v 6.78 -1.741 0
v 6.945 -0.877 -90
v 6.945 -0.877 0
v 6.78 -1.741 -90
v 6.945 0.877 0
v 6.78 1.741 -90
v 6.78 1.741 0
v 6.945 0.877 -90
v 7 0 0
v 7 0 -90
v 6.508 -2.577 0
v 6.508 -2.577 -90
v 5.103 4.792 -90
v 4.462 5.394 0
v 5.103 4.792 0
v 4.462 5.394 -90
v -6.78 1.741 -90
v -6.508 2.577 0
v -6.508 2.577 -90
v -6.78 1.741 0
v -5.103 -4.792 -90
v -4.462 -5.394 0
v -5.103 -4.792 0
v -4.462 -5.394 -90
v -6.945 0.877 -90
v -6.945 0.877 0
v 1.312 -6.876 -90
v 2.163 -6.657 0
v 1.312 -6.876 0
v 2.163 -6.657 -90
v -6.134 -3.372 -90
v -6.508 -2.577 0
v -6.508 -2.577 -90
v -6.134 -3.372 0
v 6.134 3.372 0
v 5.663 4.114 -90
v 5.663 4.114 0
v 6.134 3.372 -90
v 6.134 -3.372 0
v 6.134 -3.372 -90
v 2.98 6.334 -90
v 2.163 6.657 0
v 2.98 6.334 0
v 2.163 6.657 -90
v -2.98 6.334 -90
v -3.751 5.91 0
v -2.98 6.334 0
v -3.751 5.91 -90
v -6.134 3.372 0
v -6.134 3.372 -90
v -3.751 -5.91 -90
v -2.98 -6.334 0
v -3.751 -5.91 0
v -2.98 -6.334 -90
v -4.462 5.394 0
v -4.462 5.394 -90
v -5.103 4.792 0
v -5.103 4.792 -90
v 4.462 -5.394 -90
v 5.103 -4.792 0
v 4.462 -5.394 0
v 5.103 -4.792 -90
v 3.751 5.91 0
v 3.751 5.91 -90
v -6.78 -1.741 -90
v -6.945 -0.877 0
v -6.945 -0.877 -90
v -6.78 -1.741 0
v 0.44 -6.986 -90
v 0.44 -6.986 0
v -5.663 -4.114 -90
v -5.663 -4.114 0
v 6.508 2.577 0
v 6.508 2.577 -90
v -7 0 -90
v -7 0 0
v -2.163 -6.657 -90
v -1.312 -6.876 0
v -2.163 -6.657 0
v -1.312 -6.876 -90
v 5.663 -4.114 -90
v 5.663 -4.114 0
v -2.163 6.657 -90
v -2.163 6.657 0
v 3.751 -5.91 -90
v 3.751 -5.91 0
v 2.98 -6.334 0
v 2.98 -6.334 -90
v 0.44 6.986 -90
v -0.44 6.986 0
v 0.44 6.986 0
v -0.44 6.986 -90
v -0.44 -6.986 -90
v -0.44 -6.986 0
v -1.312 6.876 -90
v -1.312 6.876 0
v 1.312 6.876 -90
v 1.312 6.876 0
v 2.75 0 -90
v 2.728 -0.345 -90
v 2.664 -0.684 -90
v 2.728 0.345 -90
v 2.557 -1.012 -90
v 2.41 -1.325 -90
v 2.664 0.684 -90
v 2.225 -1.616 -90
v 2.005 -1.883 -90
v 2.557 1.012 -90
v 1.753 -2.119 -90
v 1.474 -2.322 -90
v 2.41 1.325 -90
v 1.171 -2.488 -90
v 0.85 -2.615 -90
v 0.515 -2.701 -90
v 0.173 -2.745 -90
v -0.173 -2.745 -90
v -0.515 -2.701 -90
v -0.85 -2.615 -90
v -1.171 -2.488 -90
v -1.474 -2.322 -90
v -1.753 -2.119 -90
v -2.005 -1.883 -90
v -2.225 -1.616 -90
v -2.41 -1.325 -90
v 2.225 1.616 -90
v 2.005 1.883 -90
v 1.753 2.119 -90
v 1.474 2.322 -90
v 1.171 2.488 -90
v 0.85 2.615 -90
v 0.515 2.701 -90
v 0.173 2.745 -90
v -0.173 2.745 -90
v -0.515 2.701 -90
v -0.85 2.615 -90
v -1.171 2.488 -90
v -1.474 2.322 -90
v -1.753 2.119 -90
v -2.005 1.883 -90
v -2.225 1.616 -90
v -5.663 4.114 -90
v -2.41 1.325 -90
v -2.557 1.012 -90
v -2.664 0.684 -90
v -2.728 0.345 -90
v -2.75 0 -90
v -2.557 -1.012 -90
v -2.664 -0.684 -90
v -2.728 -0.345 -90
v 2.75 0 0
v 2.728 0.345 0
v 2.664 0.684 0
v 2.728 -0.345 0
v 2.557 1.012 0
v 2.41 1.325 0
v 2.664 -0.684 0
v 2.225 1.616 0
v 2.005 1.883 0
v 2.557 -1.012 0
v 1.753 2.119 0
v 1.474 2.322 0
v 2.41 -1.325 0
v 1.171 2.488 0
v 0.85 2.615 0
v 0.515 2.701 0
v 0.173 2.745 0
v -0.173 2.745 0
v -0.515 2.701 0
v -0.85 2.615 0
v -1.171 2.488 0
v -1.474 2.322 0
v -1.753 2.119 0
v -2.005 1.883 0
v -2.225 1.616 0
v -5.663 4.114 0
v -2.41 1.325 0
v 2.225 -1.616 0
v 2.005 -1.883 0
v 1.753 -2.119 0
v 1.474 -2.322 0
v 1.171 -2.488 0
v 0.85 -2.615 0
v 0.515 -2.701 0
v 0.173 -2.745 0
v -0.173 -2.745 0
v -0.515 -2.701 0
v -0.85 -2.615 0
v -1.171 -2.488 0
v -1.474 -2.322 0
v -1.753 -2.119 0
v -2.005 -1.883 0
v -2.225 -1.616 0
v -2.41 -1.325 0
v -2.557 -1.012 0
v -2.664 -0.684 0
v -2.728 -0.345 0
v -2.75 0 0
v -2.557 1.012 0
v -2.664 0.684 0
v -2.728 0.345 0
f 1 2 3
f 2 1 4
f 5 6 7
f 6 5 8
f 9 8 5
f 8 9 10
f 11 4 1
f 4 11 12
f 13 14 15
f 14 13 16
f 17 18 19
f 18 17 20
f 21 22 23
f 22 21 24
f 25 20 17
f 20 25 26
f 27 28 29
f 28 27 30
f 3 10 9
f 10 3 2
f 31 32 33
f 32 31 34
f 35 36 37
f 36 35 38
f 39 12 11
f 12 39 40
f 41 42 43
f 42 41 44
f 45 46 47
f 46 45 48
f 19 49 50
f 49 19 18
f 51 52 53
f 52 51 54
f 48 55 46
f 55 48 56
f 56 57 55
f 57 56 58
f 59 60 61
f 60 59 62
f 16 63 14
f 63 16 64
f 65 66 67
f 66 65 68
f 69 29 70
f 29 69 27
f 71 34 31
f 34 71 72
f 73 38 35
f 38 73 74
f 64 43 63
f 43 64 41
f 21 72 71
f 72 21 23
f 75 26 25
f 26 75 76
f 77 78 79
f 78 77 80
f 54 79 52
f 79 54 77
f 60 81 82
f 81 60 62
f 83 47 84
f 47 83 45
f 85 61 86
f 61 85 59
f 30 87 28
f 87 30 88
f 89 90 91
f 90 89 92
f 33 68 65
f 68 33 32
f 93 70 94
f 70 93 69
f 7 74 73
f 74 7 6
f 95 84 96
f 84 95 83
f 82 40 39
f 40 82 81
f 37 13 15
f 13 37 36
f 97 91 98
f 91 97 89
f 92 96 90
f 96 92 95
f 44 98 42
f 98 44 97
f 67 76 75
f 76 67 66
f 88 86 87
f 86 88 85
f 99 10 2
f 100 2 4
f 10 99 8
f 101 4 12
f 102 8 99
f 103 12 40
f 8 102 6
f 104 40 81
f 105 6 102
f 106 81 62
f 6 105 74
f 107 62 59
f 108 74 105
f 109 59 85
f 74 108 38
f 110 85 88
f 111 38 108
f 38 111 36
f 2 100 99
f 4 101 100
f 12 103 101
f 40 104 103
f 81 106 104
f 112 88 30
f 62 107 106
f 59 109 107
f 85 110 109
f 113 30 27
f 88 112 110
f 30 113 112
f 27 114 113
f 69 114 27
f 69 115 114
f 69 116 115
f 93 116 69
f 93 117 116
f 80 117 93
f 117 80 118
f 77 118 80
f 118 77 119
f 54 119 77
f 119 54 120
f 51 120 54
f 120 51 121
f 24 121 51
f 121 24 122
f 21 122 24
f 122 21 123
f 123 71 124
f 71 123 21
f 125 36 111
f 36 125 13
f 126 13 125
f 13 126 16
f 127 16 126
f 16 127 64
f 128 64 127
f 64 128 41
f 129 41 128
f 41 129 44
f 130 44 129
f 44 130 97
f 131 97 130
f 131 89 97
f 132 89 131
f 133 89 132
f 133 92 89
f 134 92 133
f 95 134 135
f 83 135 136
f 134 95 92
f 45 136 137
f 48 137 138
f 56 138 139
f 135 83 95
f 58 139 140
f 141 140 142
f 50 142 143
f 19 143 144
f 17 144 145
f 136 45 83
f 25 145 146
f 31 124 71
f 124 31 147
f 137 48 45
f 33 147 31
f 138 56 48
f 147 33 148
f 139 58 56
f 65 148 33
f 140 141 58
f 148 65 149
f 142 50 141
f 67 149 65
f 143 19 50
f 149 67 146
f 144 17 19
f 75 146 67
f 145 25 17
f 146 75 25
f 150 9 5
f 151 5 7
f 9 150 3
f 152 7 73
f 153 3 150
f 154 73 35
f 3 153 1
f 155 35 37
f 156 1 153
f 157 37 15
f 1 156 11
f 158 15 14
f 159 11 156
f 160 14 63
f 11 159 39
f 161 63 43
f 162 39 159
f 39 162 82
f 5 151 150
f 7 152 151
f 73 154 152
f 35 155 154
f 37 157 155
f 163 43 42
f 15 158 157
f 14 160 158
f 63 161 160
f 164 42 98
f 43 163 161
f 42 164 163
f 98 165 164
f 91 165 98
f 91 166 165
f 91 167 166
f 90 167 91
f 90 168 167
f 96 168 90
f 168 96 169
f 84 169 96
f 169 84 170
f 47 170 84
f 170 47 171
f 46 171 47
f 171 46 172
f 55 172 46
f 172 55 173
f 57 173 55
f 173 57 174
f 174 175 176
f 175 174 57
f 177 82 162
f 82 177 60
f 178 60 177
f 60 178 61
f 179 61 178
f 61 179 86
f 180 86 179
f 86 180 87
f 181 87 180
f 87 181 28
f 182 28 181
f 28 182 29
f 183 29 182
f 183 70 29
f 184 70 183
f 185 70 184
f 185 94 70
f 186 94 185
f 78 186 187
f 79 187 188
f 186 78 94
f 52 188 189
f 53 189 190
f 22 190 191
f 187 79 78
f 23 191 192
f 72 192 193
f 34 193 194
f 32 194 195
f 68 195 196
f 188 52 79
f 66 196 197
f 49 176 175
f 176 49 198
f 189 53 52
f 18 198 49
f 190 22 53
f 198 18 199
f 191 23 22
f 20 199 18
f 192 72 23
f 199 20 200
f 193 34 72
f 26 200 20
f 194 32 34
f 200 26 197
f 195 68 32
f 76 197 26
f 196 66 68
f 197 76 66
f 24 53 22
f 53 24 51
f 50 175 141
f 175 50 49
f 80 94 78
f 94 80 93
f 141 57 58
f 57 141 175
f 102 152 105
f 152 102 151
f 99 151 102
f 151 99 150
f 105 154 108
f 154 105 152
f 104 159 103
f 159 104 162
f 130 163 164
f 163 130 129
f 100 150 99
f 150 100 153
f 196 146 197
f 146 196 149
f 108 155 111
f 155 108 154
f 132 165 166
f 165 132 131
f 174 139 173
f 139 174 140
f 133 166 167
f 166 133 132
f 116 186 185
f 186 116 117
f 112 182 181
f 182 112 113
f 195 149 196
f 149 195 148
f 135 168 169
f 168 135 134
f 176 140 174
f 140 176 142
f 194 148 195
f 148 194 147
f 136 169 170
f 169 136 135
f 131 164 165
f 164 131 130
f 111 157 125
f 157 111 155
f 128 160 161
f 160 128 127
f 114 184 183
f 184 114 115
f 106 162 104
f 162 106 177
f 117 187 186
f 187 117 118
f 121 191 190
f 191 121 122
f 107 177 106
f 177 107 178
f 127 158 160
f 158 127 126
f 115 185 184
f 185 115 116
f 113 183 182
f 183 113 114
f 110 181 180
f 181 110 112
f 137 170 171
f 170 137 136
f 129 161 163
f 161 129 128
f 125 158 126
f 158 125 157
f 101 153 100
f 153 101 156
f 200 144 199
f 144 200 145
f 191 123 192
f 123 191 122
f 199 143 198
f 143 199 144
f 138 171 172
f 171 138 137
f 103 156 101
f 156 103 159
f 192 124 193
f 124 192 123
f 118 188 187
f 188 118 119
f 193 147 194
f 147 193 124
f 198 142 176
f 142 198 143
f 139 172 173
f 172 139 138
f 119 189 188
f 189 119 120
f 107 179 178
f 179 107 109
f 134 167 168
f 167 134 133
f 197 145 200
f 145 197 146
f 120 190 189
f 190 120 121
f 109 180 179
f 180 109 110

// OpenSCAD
$fn = 50;


difference() {
	union() {
		translate(v = [0, 0, -90.0000000000]) {
			cylinder(h = 90, r = 7.0000000000);
		}
		cylinder(h = 0, r = 17.0000000000);
	}
	union() {
		#translate(v = [0, 0, -90]) {
			cylinder(h = 90, r = 2.7500000000);
		}
	}
}
